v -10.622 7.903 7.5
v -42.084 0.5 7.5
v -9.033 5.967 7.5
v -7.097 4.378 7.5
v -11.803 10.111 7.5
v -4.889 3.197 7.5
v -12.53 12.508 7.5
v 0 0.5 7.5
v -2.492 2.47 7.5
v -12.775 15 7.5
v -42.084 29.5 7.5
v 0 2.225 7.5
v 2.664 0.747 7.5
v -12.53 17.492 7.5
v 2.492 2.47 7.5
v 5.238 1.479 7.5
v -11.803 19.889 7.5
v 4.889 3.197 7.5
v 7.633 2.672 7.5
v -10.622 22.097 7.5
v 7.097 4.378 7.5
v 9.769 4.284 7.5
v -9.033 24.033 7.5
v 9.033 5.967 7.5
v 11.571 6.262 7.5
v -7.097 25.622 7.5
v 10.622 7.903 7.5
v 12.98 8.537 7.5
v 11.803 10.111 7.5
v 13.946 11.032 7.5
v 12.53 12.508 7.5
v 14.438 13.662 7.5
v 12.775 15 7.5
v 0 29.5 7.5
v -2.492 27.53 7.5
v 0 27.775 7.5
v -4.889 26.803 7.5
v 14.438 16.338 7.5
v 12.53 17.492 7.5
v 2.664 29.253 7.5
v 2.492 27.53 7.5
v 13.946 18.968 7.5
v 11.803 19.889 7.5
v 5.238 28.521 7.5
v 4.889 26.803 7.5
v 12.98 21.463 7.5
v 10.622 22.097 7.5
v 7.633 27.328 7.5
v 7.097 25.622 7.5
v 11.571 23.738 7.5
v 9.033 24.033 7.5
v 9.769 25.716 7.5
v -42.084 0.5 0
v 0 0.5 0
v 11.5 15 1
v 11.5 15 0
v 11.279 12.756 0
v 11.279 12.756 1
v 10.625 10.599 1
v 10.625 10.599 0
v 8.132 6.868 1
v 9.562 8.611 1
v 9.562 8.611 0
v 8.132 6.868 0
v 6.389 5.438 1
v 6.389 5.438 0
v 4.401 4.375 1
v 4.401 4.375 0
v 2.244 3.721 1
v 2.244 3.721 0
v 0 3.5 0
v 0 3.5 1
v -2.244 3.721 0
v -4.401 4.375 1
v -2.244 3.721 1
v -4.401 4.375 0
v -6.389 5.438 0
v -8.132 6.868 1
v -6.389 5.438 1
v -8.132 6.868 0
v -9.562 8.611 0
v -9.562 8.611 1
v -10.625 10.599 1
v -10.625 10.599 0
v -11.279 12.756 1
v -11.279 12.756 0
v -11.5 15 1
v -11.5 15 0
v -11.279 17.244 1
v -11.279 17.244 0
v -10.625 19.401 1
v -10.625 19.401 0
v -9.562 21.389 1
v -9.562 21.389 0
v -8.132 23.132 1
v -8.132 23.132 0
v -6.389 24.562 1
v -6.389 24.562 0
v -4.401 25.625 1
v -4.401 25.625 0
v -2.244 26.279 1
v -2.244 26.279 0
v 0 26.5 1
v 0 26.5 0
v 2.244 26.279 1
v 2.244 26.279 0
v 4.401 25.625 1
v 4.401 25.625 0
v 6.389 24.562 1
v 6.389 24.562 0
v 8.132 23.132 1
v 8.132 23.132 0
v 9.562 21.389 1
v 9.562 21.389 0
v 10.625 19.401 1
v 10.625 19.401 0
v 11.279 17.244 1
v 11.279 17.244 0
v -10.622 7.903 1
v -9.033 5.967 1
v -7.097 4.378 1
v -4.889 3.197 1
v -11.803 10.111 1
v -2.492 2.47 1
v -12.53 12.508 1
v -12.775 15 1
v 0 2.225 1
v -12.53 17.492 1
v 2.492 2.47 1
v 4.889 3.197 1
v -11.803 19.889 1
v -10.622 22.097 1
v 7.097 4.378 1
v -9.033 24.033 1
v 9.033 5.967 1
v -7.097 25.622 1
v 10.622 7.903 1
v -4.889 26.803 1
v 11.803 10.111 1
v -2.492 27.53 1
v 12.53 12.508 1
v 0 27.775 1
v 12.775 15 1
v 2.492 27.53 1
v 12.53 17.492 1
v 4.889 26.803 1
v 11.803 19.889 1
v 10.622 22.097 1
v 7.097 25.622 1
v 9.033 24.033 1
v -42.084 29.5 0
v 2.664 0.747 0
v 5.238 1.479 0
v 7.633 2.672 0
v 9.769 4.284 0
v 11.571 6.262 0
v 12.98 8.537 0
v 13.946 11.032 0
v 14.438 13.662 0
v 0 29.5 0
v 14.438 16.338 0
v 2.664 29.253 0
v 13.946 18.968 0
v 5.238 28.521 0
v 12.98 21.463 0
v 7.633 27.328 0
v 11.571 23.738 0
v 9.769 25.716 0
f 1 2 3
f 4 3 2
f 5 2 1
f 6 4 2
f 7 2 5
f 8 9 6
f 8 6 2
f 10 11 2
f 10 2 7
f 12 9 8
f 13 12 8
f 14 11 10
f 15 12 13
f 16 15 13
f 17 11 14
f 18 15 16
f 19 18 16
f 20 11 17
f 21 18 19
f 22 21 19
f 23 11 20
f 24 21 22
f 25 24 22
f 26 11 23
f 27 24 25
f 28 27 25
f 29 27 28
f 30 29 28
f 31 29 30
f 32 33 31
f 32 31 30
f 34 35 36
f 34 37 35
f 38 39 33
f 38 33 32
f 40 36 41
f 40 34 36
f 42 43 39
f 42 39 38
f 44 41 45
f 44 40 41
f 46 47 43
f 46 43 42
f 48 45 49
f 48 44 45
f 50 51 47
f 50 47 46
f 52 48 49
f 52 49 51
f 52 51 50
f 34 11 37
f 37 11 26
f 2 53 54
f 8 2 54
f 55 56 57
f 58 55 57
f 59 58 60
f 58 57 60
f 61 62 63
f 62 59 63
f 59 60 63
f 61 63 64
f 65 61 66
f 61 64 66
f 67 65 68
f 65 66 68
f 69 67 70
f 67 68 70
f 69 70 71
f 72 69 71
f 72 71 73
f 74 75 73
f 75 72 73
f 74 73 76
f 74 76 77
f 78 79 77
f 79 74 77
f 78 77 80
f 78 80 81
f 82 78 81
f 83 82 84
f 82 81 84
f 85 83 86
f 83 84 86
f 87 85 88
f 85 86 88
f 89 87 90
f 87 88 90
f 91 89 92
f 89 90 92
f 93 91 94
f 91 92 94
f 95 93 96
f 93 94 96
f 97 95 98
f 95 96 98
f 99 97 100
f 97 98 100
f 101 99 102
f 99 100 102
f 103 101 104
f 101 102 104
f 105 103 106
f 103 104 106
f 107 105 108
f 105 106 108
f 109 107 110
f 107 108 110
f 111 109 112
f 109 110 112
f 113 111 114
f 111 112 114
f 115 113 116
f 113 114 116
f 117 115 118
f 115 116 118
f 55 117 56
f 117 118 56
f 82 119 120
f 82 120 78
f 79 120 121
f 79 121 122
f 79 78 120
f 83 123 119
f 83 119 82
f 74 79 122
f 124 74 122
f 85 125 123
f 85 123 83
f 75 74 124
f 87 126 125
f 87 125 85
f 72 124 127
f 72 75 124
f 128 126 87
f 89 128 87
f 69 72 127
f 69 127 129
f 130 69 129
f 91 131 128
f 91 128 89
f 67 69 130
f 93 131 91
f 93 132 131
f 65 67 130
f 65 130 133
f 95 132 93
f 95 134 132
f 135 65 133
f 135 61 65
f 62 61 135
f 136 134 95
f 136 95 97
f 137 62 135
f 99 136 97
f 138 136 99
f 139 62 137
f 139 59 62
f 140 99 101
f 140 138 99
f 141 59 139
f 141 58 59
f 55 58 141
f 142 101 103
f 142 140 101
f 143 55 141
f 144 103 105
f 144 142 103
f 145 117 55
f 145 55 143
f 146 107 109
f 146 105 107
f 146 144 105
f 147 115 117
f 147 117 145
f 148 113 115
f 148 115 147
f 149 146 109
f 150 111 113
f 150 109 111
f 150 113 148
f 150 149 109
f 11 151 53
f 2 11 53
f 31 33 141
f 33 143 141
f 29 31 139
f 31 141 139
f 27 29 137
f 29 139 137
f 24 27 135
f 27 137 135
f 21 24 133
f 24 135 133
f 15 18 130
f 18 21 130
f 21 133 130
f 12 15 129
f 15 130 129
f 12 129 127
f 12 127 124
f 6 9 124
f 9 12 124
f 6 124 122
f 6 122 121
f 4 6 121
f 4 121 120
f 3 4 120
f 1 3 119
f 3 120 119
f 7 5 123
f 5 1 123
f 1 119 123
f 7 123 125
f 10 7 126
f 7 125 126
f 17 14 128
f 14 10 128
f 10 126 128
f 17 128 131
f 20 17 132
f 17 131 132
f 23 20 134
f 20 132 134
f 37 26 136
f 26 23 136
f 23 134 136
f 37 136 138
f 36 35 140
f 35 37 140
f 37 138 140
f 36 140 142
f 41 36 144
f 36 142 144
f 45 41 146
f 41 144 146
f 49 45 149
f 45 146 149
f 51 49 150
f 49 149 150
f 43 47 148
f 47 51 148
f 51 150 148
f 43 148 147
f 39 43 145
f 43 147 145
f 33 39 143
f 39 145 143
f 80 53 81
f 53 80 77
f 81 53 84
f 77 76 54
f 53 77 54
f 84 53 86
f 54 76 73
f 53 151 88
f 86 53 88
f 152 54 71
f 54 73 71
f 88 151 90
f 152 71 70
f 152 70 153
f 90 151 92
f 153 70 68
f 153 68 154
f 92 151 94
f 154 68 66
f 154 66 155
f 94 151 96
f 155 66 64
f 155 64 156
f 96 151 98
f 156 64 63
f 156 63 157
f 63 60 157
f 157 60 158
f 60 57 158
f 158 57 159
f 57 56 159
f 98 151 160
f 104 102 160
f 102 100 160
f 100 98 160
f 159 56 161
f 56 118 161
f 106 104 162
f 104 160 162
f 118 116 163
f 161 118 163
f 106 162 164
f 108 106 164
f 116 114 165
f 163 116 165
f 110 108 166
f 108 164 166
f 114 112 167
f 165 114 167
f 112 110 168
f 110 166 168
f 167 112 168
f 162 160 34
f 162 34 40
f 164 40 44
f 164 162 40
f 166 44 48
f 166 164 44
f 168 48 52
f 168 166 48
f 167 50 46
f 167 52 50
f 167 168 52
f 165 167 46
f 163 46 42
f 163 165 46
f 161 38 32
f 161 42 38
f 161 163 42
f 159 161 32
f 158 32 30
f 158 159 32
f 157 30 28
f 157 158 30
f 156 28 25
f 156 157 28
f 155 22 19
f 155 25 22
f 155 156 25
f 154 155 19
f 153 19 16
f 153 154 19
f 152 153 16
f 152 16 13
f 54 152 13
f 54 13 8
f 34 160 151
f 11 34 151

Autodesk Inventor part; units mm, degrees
ref_plane "YZ Plane" through (0, 0, 0) normal (1, 0, 0) x (0, 1, 0)
ref_plane "XZ Plane" through (0, 0, 0) normal (0, 1, 0) x (-1, 0, 0)
ref_plane "XY Plane" through (0, 0, 0) normal (0, 0, 1) x (1, 0, 0)
ref_plane "Work Plane1" through (0, 0, 0) normal (0, 0, 1) x (1, 0, 0)
sketch "Sketch1" plane through (0, 0, 0) normal (0, 0, 1) x (1, 0, 0)
  arc A0 (-18.155, 30) -> (-18.155, 0) centre (0, 15) ccw construction
  line L0 (-18.155, 0) -> (-3.4871, 0) construction
  line L1 (-18.155, 30) -> (-3.4871, 30) construction
  circle A1 centre (0, 15) radius 15.4 construction
  arc A2 (-6.5238, 29.5) -> (-6.5238, 0.5) centre (0, 15) ccw construction
  line L2 (-6.5238, 0.5) -> (-17.9179, 0.5) construction
  arc A3 (-17.9179, 29.5) -> (-17.9179, 0.5) centre (0, 15) ccw construction
  line L3 (-17.9179, 29.5) -> (-6.5238, 29.5) construction
  circle A4 centre (0, 15) radius 12.775 construction
  line L4 (-6.5238, 29.5) -> (0, 29.5) construction
  line L5 (-6.5238, 0.5) -> (0, 0.5) construction
  arc A5 (0, 0.5) -> (0, 29.5) centre (0, 15) ccw construction
  line L6 (-42.0841, 29.5) -> (-42.0841, 0.5)
  line L7 (-42.0841, 0.5) -> (0, 0.5)
  line L8 (-42.0841, 29.5) -> (0, 29.5)
  circle A6 centre (0, 15) radius 11.5
  arc A7 (0, 0.5) -> (0, 29.5) centre (0, 15) ccw
  arc A8 (-3.4871, 0) -> (3.4871, 0) centre (0, 15) ccw projected
  line L9 (3.4871, 0) -> (18, 0) projected
  line L10 (18, 0) -> (18, 30) projected
  line L11 (3.4871, 30) -> (18, 30) projected
  arc A9 (3.4871, 30) -> (-3.4871, 30) centre (0, 15) ccw projected
  line L12 (-7.3927, 28.5095) -> (7.3927, 28.5095) projected
  arc A10 (7.3927, 1.4905) -> (7.3927, 28.5095) centre (0, 15) ccw projected
  line L13 (7.3927, 1.4905) -> (-7.3927, 1.4905) projected
  arc A11 (-7.3927, 28.5095) -> (-7.3927, 1.4905) centre (0, 15) ccw projected
  point P0 (0, 0)
  dimension "d0" = 0.5
  dimension "d1" = 25.55
  dimension "d2" = 23
extrude "Extrusion1" add sketch "Sketch1" along normal blind 1 contours L8 A7 L12 A11 L13 L7 L6 | A7 L13 A11 L12
sketch "Sketch2" plane through (0, 0, 1) normal (0, 0, 1) x (1, 0, 0)
  circle A0 centre (0, 15) radius 11.5 projected
  line L0 (0, 29.5) -> (-42.0841, 29.5) projected
  line L1 (-42.0841, 29.5) -> (-42.0841, 0.5) projected
  line L2 (-42.0841, 0.5) -> (0, 0.5) projected
  arc A1 (0, 0.5) -> (0, 29.5) centre (0, 15) ccw projected
  circle A2 centre (0, 15) radius 12.775
  point P0 (0, 0)
  dimension "d5" = 25.55
extrude "Extrusion2" add sketch "Sketch2" along normal blind 6.5 contours A1 L2 L1 L0
properties part number "10_Filteslide_25mm"
